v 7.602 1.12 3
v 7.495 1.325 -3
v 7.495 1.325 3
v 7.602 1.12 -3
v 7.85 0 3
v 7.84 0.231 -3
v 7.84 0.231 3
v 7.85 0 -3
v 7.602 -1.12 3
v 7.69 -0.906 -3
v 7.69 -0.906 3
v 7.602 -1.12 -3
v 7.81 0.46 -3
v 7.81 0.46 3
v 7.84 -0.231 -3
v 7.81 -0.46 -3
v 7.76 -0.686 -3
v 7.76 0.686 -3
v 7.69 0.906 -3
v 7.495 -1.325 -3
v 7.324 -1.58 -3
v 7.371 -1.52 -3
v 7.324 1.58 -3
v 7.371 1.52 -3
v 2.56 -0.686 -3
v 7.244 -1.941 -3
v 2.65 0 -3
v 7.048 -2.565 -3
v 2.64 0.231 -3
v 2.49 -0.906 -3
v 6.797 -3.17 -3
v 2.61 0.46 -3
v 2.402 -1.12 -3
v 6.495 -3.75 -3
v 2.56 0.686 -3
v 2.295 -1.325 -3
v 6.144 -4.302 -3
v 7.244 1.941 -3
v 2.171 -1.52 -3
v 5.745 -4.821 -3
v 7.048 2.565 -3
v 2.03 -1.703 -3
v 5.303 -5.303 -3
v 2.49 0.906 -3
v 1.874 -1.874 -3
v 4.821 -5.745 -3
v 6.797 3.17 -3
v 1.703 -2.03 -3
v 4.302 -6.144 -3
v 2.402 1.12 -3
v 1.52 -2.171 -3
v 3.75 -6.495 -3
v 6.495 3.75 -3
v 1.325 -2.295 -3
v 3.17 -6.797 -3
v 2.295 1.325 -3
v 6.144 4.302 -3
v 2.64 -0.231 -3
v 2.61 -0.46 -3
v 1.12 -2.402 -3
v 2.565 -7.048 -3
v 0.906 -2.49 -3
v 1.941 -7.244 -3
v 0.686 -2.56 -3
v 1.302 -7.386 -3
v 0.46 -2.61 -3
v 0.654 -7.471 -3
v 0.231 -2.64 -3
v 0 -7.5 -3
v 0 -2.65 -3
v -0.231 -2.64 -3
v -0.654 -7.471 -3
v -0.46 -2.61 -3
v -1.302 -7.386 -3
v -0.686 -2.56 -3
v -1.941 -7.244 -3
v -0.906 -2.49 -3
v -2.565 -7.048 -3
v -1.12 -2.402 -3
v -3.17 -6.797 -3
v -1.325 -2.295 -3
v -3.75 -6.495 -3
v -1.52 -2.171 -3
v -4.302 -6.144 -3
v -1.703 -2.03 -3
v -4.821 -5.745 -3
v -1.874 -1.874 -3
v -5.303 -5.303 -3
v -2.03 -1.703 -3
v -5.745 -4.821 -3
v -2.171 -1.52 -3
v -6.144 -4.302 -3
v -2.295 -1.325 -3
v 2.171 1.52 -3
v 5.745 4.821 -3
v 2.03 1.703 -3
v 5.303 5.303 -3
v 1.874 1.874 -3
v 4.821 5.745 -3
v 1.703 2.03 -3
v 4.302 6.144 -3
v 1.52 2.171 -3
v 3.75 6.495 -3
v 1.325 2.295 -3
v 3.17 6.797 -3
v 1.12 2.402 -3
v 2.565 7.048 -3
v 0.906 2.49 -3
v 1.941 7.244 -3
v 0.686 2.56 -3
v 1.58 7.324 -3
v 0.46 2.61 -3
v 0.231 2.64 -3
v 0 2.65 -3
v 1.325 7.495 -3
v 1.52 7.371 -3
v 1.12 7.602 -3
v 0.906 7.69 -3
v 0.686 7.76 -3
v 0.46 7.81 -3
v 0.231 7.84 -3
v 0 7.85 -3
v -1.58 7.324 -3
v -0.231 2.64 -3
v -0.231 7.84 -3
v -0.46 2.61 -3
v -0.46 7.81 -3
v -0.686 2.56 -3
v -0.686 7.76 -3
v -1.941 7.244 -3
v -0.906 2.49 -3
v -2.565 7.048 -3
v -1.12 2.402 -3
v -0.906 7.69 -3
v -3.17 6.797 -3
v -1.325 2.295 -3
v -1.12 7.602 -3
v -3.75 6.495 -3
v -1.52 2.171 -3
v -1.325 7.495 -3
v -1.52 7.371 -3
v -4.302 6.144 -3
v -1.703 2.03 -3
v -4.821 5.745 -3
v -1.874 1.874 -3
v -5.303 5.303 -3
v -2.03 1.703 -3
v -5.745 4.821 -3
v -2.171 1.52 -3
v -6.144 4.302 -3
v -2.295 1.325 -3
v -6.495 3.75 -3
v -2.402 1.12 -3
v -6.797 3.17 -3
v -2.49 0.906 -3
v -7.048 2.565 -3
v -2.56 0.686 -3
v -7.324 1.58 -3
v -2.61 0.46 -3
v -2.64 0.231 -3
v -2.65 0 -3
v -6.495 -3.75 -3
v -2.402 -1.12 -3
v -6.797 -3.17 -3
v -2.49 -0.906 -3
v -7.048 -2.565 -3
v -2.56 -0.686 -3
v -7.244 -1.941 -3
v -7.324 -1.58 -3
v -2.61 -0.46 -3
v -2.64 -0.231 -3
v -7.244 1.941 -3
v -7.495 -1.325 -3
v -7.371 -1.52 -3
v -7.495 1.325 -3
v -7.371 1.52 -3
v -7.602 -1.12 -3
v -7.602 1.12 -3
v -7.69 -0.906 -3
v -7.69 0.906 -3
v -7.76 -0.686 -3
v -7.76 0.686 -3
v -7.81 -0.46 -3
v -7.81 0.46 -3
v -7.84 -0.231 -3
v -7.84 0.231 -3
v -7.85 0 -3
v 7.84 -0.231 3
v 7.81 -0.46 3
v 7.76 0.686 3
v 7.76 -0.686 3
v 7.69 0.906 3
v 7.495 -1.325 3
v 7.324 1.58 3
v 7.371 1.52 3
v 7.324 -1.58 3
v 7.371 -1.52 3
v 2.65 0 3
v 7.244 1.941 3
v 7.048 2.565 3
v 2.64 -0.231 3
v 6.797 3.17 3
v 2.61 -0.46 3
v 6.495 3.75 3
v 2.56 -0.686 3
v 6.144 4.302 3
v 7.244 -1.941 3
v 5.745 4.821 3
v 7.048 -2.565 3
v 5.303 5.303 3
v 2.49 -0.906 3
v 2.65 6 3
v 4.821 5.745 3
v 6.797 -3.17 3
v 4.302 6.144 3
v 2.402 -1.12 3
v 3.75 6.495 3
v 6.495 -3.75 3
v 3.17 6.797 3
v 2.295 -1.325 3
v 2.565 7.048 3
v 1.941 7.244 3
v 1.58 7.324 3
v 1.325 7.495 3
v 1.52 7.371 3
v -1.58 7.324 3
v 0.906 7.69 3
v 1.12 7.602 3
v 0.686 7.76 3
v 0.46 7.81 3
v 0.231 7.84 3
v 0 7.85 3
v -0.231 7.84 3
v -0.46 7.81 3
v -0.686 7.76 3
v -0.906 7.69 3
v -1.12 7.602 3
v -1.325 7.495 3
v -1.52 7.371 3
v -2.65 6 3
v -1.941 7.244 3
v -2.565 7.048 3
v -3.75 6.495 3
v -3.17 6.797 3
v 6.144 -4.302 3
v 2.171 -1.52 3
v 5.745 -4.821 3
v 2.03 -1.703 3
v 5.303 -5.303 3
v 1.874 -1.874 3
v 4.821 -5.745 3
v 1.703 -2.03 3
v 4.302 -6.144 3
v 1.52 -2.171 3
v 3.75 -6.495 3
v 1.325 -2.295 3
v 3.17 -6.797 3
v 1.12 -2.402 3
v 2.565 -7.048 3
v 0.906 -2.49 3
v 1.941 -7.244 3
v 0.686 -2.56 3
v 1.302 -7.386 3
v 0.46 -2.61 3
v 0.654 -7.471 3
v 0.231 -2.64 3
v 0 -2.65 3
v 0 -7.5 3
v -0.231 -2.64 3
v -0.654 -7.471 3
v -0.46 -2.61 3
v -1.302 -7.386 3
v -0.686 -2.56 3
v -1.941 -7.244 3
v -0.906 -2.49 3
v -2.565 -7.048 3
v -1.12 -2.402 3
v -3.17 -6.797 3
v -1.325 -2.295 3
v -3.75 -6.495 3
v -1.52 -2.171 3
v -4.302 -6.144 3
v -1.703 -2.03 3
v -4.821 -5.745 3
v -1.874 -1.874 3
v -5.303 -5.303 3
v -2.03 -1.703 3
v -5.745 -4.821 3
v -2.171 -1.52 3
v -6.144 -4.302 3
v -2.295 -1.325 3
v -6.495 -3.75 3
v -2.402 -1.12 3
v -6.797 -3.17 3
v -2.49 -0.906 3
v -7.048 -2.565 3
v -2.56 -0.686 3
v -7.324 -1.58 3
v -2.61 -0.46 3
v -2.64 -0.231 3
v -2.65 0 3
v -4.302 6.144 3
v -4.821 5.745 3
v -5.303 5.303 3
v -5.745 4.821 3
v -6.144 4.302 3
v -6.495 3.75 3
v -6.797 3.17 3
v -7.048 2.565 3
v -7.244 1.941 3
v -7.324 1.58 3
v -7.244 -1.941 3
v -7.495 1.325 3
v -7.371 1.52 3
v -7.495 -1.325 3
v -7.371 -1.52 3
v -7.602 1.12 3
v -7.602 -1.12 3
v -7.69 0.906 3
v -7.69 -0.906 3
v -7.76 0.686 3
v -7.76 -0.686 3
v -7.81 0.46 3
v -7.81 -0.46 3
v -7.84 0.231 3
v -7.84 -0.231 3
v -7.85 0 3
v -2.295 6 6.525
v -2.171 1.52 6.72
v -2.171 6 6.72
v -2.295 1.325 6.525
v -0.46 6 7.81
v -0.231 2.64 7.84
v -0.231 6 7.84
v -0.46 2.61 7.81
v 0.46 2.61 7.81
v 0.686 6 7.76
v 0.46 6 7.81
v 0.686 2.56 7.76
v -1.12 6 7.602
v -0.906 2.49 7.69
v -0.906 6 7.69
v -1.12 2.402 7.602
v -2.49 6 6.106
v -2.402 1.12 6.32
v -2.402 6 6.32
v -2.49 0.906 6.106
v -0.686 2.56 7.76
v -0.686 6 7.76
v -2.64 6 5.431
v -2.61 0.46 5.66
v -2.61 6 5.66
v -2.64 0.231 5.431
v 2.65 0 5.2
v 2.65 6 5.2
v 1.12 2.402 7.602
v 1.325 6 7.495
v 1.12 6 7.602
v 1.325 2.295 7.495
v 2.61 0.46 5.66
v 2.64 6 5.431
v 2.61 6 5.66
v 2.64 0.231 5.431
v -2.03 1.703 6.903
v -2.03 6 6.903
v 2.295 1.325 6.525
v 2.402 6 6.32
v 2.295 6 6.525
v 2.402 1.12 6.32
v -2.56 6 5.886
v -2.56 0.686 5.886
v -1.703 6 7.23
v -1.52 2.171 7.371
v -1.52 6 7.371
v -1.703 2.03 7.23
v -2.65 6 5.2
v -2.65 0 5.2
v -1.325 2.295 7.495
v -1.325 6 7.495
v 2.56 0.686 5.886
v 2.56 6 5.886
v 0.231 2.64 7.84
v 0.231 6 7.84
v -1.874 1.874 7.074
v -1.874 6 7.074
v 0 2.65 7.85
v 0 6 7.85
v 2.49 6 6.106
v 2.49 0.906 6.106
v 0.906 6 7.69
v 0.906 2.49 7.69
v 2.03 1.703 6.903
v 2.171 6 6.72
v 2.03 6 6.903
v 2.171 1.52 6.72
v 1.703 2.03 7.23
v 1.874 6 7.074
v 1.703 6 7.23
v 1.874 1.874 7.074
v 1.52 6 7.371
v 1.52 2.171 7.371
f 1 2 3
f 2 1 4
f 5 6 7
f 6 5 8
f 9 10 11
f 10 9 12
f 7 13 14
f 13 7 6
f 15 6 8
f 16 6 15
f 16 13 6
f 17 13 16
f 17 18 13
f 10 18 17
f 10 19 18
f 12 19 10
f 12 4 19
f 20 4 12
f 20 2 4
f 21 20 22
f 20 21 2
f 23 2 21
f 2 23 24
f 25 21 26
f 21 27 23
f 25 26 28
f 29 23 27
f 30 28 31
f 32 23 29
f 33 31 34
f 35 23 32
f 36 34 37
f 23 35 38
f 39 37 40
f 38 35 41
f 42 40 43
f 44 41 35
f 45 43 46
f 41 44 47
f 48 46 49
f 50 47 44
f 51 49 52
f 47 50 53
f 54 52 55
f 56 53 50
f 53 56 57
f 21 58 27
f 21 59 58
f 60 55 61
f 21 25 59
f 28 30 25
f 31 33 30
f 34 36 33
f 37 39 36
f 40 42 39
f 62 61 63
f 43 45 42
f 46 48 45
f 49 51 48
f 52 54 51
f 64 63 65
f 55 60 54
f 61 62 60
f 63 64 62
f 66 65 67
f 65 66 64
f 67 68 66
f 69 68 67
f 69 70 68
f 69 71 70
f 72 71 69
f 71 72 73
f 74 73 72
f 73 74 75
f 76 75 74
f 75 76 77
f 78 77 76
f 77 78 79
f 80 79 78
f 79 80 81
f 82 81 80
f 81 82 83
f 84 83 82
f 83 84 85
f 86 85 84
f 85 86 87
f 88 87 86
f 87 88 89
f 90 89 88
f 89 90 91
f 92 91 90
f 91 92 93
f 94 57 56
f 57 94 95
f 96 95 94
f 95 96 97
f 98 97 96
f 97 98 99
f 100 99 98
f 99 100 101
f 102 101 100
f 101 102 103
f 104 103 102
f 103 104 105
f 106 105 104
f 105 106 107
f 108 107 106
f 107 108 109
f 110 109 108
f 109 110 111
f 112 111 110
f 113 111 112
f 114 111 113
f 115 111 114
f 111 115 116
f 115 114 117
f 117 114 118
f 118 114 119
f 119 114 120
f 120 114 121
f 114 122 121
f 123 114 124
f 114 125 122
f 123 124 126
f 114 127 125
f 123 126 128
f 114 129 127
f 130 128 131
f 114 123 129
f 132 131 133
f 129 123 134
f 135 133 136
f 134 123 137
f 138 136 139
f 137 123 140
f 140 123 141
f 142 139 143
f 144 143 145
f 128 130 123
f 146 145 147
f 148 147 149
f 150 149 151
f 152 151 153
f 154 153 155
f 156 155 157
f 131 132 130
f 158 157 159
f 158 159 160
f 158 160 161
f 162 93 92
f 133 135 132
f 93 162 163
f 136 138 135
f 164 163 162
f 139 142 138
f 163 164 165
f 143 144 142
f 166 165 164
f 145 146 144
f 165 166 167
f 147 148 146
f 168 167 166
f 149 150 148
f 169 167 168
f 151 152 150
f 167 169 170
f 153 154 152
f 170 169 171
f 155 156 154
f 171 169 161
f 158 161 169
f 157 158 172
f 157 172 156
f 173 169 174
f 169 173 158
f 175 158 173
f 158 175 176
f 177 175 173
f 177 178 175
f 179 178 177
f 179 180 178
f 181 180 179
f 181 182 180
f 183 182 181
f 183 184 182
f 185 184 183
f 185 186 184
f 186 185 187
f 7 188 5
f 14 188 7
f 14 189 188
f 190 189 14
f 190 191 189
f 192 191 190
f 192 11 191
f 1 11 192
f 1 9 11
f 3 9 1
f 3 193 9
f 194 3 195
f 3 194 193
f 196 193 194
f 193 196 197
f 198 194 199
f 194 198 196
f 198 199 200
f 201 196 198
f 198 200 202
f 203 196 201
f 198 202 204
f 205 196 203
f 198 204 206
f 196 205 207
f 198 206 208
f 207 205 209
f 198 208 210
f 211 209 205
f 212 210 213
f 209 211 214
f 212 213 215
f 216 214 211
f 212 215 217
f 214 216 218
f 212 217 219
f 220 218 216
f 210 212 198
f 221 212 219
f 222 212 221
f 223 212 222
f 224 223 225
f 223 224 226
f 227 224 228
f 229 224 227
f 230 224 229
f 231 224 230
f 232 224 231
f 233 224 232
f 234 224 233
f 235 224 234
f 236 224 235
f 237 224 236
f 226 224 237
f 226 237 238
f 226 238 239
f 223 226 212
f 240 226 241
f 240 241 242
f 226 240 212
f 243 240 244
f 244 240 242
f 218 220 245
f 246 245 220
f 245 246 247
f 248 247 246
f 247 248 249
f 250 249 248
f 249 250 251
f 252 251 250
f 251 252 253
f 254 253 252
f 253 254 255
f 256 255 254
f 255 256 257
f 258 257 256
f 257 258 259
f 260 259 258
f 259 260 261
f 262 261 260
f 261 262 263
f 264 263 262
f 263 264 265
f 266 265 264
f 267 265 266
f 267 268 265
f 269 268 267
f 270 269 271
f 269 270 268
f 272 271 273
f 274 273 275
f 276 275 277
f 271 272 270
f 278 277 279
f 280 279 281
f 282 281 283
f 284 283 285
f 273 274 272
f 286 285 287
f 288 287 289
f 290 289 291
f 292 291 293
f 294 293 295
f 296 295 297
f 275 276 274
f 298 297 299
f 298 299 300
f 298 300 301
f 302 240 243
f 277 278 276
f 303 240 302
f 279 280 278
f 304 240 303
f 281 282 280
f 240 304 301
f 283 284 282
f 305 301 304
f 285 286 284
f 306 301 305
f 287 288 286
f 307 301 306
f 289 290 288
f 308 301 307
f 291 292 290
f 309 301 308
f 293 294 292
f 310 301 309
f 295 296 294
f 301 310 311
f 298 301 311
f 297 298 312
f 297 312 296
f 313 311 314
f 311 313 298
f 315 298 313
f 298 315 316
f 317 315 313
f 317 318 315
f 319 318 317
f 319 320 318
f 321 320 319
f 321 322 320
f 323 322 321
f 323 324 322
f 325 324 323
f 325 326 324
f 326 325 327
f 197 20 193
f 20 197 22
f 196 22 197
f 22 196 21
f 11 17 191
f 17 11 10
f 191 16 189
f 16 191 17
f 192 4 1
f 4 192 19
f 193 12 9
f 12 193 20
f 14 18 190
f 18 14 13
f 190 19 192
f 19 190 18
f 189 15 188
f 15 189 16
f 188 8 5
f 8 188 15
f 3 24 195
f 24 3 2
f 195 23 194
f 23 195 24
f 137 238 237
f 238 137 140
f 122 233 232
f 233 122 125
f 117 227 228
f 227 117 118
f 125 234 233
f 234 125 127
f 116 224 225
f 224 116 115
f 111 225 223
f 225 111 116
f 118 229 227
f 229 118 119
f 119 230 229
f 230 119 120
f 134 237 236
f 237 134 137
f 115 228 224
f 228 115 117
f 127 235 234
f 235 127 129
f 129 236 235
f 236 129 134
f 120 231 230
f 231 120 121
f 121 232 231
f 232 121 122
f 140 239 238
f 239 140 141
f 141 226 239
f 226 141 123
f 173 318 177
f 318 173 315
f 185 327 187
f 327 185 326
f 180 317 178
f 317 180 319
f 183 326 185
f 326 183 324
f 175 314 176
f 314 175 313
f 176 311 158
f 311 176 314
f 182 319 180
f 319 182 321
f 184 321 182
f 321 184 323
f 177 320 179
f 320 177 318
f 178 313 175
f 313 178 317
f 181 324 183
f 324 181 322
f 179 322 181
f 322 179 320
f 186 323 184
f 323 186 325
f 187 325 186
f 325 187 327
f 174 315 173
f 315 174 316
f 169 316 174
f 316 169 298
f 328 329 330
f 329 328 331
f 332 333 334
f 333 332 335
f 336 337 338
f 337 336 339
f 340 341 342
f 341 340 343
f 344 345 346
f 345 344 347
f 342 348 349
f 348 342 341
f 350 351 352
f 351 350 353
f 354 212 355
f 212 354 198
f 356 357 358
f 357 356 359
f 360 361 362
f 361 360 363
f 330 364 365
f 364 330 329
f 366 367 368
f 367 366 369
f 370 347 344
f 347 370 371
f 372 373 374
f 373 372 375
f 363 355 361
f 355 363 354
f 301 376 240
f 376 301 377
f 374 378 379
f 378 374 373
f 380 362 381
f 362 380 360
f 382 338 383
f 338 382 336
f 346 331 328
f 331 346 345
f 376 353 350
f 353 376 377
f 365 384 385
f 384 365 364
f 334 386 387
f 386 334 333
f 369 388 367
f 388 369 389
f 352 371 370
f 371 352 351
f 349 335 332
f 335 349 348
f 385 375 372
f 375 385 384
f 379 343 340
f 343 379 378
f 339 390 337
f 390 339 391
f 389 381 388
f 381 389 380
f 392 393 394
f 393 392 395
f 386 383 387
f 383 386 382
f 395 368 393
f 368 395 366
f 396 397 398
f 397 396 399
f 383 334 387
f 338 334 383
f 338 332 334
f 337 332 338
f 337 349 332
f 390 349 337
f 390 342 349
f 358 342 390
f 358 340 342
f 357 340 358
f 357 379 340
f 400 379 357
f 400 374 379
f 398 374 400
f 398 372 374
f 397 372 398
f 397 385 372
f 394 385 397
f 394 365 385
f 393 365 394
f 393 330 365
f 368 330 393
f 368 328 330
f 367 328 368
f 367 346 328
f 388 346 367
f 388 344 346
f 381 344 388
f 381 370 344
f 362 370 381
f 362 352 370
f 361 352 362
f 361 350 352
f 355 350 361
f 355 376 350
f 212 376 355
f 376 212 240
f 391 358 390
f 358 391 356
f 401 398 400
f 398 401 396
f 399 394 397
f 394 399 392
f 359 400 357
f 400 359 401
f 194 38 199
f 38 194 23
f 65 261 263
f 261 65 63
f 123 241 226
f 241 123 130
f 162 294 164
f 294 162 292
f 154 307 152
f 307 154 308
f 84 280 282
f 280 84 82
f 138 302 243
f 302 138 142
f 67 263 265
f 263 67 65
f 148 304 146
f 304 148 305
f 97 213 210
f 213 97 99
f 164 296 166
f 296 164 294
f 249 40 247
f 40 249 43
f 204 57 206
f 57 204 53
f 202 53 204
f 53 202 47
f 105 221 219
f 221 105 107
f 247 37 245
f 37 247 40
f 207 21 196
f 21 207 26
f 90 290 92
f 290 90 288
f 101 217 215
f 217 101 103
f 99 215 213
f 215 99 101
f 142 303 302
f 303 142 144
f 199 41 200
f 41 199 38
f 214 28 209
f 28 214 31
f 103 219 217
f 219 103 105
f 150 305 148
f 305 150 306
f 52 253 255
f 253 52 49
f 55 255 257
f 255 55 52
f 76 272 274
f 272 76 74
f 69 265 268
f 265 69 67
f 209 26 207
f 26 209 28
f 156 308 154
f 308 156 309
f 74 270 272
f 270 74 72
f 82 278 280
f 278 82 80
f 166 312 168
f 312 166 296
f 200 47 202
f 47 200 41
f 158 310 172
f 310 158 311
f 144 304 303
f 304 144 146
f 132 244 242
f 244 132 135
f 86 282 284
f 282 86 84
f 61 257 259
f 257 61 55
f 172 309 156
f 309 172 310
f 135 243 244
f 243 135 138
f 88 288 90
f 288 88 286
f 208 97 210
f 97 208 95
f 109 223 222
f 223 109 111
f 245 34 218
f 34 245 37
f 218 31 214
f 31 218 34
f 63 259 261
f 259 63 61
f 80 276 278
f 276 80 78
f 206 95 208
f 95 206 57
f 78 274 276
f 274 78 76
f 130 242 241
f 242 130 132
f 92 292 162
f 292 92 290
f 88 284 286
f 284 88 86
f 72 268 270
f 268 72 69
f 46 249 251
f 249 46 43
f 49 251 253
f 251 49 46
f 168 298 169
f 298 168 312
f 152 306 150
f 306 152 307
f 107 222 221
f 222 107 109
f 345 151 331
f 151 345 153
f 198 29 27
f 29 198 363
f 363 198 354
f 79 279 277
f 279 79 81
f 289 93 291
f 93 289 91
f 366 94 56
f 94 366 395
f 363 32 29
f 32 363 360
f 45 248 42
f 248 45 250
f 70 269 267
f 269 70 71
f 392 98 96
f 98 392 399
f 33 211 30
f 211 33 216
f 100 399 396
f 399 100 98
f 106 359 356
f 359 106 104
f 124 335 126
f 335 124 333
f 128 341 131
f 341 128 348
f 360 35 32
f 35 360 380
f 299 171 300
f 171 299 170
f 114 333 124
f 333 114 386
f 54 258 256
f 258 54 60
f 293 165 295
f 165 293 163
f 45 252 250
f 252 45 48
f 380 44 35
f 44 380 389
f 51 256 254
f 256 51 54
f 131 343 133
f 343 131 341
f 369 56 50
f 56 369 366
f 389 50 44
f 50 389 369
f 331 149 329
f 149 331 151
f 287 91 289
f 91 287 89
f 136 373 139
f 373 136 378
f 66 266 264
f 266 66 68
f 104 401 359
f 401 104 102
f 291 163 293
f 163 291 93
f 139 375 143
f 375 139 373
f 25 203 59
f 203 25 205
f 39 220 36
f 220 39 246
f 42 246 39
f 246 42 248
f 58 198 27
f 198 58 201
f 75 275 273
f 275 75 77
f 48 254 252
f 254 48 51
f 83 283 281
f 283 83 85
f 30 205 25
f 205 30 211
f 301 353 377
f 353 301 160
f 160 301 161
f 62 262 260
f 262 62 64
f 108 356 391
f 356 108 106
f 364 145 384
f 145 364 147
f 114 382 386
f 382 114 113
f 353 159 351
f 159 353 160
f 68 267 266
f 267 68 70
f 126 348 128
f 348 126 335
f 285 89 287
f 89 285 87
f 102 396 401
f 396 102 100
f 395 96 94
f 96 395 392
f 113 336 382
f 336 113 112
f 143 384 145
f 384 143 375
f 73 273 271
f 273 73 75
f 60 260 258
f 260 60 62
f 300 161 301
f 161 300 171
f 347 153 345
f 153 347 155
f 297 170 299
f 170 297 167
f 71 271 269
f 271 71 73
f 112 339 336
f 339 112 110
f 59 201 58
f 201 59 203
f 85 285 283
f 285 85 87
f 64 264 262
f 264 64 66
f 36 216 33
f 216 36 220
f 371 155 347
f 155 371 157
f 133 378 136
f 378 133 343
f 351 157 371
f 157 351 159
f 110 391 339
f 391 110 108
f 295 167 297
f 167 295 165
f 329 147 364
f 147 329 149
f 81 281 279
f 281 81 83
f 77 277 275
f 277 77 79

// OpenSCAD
// K'NEX Purple 4-Way 3D Connector (3 planar at 90° + 1 upward)
$fn = 72;

hub_r = 7.5;
hub_h = 6.0;
arm_w = 5.3;
arm_h = 6.0;
arm_len = 12.7;
hole_r = 2.65;
slot_w = 1.2;

module arm() {
    difference() {
        hull() {
            cylinder(h=arm_h, r=arm_w/2, center=true);
            translate([arm_len - hub_r, 0, 0])
                cylinder(h=arm_h, r=arm_w/2, center=true);
        }
        translate([arm_len, 0, 0])
            cylinder(h=arm_h+2, r=hole_r, center=true);
        translate([arm_len, 0, 0]) {
            translate([0, 0, arm_h/2])
                cube([slot_w, hole_r*2+1, 2], center=true);
            translate([0, 0, -arm_h/2])
                cube([slot_w, hole_r*2+1, 2], center=true);
        }
    }
}

module connector_4way_3d() {
    difference() {
        union() {
            cylinder(h=hub_h, r=hub_r, center=true);
            
            // 3 planar arms (N, E, S — no W arm, replaced by upward)
            for (a = [0, 90, 180]) {
                rotate([0, 0, a]) arm();
            }
            
            // Upward arm (along +Z)
            rotate([90, 0, 0])
                translate([0, 0, -hub_h/2])
                    difference() {
                        hull() {
                            cylinder(h=arm_h, r=arm_w/2, center=true);
                            translate([0, arm_len - hub_r, 0])
                                cylinder(h=arm_h, r=arm_w/2, center=true);
                        }
                        translate([0, arm_len, 0])
                            cylinder(h=arm_h+2, r=hole_r, center=true);
                    }
        }
        // Center axle hole
        cylinder(h=arm_len*2+4, r=hole_r, center=true);
    }
}

connector_4way_3d();
